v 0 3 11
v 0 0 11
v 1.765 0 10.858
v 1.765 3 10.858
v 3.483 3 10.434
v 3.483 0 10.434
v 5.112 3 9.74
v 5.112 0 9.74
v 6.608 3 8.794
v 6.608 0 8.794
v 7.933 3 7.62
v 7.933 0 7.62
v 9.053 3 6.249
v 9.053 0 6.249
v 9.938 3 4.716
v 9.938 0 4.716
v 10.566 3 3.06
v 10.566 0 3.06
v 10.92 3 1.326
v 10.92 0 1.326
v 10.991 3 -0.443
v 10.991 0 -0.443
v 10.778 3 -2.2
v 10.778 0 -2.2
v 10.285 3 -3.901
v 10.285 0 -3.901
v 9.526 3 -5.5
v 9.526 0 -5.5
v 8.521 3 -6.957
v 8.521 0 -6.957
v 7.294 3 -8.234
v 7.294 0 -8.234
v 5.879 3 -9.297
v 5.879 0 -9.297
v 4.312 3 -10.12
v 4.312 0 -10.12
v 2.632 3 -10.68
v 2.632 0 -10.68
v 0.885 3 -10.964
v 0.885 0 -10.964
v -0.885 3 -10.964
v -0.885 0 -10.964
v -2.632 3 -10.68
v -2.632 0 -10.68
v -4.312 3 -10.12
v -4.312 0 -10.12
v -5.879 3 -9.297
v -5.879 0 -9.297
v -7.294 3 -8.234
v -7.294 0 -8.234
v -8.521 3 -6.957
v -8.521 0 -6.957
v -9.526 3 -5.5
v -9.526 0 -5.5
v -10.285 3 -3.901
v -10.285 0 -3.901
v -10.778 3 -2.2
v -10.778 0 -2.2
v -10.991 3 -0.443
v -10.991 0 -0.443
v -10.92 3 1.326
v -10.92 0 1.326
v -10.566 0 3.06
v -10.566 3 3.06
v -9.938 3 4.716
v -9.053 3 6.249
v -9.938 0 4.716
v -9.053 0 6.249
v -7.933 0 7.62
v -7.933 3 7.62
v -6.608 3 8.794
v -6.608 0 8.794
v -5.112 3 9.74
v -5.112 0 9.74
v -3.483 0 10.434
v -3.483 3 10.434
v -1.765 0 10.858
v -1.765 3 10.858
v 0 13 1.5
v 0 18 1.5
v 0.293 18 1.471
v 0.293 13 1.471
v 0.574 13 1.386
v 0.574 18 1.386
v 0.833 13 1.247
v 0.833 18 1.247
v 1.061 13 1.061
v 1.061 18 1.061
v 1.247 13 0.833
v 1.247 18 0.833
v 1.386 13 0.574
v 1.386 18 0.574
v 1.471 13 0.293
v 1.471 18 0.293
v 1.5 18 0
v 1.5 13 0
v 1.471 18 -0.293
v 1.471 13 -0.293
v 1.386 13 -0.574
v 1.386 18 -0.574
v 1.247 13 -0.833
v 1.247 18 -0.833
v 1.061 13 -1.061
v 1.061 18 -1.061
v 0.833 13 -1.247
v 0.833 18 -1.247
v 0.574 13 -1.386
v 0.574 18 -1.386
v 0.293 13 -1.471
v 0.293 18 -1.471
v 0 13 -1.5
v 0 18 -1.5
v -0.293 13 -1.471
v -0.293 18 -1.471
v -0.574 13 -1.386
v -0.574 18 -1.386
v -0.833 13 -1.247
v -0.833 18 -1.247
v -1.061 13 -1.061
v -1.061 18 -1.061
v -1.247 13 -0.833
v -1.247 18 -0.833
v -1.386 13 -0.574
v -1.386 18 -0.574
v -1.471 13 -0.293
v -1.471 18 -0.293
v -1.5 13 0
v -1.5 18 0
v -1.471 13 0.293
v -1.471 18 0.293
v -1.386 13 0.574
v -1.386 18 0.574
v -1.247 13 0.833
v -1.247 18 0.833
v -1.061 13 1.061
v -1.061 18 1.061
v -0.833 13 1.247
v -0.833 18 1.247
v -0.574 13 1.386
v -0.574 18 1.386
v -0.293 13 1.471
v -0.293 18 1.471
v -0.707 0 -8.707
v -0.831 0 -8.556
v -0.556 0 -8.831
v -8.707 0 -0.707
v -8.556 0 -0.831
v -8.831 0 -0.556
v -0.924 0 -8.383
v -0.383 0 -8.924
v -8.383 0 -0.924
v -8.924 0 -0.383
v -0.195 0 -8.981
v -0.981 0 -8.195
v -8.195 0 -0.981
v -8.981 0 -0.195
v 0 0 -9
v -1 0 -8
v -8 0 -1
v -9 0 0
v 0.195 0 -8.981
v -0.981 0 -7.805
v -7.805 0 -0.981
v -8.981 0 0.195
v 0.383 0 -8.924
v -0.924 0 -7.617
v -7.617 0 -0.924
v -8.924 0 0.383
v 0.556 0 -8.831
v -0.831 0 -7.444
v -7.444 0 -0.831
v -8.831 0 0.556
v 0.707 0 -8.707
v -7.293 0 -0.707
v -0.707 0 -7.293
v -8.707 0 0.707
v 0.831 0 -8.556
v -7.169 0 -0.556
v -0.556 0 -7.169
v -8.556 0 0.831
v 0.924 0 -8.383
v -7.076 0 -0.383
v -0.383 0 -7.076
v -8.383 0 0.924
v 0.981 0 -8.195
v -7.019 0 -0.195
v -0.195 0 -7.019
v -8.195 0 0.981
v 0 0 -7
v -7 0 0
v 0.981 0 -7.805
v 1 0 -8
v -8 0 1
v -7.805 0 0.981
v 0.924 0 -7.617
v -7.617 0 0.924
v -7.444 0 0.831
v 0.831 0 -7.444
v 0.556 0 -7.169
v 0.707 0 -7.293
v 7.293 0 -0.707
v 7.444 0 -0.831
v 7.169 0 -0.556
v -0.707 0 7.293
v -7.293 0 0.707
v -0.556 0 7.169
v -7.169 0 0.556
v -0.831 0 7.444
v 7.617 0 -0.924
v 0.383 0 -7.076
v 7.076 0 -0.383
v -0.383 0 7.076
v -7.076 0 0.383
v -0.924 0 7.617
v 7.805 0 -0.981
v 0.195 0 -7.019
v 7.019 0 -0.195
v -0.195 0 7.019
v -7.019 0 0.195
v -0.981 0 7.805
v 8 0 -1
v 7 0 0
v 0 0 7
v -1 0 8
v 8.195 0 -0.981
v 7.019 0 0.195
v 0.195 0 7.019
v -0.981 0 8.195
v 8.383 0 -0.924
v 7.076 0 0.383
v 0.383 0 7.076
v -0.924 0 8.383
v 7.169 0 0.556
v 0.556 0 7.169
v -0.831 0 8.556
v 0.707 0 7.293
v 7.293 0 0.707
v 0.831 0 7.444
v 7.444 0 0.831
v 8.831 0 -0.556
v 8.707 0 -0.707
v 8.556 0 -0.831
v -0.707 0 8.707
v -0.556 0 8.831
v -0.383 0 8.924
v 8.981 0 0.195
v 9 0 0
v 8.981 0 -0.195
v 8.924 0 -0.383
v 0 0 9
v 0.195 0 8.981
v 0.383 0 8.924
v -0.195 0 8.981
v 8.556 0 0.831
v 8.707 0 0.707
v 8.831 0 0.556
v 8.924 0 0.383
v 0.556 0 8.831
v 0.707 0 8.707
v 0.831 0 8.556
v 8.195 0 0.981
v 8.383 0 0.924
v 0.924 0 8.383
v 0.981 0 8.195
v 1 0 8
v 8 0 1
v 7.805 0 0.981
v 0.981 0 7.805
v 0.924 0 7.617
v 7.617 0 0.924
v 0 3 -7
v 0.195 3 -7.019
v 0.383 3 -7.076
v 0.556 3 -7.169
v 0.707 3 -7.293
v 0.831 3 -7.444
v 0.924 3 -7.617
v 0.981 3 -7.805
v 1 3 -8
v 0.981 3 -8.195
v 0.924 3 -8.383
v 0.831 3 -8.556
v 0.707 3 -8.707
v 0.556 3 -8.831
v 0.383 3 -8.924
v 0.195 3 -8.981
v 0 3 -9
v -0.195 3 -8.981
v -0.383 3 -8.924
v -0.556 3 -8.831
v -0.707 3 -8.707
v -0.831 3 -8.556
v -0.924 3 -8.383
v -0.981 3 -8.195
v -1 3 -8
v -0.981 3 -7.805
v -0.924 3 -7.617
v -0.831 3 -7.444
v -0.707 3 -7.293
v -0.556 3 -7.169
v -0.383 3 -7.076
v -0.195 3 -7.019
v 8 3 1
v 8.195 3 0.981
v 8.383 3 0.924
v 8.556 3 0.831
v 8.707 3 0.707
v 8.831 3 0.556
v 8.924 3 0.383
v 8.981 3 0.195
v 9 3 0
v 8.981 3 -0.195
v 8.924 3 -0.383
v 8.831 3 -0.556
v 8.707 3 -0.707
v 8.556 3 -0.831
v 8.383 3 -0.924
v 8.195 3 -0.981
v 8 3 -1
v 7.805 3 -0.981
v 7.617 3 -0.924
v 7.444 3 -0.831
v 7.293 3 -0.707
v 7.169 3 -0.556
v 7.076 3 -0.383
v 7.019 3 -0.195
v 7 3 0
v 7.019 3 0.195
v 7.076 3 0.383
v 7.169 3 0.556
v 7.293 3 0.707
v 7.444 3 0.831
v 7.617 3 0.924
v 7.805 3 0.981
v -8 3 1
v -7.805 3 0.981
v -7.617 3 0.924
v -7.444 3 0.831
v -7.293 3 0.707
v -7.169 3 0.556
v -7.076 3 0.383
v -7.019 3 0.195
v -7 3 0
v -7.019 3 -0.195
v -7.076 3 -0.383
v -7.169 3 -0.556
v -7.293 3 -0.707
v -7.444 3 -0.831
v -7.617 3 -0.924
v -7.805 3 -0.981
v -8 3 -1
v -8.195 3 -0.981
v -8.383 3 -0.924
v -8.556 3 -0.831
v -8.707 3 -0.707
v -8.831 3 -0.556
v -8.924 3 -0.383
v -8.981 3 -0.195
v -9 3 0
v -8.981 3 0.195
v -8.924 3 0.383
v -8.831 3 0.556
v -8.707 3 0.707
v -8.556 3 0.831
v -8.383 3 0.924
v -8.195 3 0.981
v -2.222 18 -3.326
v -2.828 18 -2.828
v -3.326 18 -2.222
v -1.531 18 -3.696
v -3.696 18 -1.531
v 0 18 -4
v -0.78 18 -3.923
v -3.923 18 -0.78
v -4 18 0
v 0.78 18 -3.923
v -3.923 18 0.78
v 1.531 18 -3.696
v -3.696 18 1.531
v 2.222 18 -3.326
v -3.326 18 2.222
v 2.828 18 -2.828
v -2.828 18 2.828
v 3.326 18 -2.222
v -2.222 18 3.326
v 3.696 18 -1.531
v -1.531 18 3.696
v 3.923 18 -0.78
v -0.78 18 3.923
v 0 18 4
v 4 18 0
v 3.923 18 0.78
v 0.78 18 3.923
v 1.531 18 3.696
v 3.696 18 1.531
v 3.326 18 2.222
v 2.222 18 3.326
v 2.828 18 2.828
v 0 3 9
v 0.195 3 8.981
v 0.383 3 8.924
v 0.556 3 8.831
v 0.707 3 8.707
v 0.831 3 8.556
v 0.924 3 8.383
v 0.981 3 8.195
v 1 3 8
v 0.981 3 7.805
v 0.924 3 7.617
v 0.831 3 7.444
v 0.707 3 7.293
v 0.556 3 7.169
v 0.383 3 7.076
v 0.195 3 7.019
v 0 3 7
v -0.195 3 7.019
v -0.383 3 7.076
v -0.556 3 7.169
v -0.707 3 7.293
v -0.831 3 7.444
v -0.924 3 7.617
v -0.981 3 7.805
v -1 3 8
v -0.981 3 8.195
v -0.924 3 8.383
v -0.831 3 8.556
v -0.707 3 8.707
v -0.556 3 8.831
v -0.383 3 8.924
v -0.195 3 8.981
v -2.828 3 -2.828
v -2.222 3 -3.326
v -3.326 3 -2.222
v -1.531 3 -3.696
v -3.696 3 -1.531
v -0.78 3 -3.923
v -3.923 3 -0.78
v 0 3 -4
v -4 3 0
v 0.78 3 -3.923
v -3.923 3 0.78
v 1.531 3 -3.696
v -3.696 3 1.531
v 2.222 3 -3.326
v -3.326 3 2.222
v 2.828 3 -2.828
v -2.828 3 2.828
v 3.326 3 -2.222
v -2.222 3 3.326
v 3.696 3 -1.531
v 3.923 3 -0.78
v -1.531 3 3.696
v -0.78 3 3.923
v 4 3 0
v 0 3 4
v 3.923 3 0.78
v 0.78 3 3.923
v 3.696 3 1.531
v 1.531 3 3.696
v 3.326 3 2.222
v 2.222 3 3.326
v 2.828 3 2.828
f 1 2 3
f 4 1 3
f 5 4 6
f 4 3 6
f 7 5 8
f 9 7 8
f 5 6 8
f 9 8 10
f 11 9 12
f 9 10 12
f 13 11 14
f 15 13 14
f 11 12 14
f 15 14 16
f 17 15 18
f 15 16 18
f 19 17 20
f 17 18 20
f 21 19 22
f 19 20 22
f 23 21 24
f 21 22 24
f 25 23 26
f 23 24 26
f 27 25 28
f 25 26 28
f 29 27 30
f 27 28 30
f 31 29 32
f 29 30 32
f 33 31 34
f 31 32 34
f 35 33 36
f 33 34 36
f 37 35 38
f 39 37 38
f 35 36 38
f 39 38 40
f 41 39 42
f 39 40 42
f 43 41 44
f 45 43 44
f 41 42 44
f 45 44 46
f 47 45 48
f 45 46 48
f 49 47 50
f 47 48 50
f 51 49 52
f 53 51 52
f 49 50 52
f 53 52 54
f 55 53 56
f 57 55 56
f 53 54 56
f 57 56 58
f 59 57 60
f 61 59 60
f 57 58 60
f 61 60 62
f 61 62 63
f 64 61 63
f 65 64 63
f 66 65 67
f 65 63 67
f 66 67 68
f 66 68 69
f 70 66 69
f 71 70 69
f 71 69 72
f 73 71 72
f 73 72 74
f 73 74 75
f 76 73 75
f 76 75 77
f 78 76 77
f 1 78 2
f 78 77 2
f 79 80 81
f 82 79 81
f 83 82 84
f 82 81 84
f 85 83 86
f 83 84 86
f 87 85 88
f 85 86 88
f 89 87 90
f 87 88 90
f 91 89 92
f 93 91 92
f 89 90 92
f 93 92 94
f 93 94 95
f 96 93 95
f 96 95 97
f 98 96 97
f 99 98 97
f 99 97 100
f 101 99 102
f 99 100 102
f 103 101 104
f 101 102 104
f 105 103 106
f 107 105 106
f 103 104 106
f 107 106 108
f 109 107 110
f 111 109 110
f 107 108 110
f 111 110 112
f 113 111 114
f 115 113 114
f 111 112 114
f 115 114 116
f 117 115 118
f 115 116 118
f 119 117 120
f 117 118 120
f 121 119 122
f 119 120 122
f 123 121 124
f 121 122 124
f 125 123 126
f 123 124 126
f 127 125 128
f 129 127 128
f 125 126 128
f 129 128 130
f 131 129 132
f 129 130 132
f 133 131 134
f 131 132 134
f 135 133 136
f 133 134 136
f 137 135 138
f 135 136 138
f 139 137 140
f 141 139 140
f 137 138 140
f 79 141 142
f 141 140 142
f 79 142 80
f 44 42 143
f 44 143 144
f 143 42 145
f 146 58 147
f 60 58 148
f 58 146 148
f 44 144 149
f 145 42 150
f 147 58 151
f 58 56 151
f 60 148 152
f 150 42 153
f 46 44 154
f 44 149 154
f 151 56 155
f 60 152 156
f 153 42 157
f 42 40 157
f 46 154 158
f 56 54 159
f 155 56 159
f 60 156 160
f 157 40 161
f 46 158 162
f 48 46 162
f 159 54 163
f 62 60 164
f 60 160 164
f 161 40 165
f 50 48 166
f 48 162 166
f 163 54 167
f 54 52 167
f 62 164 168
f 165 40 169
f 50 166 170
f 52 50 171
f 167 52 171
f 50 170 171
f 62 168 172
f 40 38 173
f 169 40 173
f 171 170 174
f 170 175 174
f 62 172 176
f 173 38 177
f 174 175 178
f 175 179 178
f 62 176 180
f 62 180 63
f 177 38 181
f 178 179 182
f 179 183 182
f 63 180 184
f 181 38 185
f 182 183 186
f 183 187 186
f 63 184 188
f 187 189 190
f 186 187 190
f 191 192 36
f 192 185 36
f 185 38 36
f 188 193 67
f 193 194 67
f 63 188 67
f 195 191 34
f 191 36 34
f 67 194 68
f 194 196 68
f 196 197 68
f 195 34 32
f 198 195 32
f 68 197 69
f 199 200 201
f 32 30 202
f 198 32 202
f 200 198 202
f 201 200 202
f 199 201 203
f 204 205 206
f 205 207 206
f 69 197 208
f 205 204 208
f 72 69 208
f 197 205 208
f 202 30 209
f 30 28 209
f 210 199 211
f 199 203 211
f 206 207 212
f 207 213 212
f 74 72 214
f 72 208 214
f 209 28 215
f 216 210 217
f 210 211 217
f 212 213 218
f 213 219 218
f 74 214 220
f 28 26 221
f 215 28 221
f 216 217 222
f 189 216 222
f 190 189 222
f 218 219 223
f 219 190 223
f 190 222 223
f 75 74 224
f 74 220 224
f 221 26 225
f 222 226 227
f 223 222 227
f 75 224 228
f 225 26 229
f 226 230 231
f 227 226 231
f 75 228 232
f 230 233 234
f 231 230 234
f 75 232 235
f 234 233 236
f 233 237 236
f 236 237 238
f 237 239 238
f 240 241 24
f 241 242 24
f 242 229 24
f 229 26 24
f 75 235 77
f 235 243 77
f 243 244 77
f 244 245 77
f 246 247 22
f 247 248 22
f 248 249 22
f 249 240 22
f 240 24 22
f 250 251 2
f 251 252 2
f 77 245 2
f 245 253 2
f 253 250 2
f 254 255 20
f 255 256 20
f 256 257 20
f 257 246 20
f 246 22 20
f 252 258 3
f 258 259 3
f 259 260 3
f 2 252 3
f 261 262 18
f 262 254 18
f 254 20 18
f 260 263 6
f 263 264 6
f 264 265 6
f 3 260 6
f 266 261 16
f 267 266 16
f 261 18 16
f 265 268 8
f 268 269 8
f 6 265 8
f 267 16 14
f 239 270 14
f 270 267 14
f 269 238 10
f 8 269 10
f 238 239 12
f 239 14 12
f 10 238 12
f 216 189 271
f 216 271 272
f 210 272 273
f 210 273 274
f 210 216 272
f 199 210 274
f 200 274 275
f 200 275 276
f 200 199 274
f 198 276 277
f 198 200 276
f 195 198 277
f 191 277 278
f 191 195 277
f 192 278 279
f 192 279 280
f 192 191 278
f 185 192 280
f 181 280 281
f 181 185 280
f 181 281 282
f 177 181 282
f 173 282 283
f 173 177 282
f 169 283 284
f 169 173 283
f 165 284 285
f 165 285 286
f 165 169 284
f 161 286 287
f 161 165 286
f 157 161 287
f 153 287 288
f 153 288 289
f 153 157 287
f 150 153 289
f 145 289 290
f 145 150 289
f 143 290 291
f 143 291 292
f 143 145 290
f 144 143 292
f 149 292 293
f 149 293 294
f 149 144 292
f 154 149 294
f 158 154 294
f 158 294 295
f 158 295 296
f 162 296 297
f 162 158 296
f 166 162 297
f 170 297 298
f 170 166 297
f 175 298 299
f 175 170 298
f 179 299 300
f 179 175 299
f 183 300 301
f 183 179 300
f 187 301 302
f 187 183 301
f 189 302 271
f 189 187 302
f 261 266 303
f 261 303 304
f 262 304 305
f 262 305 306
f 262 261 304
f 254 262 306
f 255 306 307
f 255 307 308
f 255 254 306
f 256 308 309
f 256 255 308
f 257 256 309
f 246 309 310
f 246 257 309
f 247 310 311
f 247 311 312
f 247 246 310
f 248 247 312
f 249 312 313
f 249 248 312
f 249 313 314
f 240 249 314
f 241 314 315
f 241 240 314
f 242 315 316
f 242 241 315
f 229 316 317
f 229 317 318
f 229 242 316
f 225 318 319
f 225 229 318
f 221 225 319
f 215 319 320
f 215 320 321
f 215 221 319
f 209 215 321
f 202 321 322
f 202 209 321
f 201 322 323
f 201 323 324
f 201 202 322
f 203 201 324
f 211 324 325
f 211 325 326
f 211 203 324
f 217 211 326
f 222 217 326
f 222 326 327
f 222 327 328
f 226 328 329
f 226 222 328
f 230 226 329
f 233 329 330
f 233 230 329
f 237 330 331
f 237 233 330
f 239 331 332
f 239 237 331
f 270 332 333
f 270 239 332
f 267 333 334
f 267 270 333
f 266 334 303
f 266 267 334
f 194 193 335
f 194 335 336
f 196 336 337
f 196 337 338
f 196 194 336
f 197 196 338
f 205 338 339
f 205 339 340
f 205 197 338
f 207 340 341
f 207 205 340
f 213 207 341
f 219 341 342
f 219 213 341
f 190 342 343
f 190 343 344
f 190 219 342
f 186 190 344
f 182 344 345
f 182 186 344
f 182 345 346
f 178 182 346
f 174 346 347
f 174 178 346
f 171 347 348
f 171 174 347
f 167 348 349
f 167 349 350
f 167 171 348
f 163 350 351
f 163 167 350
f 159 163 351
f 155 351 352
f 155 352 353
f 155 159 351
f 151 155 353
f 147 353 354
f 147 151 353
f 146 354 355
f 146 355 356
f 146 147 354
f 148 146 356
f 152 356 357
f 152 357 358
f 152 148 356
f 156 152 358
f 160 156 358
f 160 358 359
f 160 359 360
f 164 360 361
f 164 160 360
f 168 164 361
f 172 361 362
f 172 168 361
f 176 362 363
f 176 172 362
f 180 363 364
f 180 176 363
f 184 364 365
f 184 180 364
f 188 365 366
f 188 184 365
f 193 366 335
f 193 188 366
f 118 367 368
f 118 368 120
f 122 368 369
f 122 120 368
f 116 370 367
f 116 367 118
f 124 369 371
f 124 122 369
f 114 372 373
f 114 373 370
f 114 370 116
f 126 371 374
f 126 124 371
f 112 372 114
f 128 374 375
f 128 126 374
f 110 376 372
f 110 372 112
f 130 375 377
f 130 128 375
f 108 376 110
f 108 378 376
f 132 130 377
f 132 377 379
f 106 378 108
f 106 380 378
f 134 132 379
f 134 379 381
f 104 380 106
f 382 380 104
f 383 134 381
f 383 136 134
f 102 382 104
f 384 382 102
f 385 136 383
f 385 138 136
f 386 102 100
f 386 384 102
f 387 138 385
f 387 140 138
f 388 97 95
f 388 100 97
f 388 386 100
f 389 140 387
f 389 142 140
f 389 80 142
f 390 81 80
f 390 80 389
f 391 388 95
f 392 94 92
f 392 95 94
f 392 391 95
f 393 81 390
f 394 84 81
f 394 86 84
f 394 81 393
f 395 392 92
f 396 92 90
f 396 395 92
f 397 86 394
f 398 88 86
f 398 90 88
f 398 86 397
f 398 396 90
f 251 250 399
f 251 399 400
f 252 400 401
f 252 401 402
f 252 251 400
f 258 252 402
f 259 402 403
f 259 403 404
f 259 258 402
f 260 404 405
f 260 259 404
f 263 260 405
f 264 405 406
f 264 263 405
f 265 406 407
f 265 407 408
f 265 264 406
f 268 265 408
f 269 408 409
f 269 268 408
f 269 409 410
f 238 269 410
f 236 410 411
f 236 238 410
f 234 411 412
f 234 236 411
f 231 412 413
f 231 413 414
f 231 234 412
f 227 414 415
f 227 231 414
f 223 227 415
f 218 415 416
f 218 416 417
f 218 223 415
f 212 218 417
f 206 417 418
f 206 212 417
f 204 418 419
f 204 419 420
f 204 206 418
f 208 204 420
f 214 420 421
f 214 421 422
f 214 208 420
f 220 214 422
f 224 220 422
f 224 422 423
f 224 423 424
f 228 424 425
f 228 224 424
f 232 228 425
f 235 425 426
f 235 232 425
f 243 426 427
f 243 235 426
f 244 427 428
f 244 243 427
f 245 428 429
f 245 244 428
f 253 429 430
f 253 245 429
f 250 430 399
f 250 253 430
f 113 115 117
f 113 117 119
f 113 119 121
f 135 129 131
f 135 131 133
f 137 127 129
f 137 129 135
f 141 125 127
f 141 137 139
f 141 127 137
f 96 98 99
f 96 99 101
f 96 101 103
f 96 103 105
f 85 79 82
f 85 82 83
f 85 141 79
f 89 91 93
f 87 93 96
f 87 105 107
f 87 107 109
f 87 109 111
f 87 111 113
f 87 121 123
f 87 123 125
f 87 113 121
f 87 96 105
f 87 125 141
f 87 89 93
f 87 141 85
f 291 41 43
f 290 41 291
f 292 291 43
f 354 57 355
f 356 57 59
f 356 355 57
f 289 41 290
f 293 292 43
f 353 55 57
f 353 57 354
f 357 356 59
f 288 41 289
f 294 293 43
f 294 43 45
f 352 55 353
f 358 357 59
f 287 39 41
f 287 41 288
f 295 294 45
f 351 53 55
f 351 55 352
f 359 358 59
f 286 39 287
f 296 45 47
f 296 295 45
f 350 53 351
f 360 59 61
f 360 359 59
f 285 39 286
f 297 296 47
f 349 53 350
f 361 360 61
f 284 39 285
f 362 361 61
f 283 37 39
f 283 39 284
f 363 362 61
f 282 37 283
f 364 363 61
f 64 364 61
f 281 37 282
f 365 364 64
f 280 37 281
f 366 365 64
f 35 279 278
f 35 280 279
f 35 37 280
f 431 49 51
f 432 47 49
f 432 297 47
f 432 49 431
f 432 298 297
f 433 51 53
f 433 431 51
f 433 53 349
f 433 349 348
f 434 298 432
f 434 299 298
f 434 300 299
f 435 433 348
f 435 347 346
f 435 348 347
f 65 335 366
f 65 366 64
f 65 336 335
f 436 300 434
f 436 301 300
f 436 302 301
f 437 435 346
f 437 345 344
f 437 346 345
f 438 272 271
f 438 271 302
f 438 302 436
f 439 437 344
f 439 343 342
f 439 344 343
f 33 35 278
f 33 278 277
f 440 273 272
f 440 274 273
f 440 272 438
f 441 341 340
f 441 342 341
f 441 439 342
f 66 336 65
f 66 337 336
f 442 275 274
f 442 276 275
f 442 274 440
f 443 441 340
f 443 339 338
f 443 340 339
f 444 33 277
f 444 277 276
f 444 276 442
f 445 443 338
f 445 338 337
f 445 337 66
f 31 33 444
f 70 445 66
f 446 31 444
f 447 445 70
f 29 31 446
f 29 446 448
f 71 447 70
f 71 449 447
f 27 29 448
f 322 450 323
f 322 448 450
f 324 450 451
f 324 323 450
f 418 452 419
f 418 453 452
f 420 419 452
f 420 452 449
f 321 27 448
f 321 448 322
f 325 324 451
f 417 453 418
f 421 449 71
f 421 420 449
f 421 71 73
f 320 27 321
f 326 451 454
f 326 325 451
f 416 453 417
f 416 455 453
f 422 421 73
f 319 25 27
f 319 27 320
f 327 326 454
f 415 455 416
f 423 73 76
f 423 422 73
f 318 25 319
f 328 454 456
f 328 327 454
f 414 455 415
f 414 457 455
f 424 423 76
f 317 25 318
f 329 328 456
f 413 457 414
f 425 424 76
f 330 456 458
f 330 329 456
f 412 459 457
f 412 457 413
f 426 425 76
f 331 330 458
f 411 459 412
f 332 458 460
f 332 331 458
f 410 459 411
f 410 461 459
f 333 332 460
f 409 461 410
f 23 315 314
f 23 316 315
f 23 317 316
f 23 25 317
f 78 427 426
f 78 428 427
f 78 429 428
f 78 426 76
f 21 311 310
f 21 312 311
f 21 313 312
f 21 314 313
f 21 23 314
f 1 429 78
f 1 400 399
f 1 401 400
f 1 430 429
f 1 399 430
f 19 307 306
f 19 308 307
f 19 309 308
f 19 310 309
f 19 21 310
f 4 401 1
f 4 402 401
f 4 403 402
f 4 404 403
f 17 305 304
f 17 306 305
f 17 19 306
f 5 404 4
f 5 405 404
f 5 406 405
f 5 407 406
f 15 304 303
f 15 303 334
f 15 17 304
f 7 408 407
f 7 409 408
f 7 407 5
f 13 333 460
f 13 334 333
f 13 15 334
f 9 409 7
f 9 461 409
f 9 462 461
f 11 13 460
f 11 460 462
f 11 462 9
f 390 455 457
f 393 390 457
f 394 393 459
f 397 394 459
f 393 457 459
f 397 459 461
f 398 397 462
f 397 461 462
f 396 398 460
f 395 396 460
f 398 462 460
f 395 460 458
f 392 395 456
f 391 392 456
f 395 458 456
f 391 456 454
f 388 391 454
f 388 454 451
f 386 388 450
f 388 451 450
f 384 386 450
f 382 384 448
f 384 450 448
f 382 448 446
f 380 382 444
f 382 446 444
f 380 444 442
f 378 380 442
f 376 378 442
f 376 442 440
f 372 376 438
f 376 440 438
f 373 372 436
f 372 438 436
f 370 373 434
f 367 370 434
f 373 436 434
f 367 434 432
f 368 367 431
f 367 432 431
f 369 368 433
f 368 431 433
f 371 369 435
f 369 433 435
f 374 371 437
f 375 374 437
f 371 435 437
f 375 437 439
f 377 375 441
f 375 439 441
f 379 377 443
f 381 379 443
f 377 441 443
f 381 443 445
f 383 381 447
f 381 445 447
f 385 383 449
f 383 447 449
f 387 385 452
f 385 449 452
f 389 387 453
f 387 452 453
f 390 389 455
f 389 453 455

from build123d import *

# Parameters (mm, degrees)
SKETCH1_R           = 11
SKETCH1_R_2         = 1
BOSS_EXTRUDE1_DEPTH = 3
SKETCH2_R           = 4
BOSS_EXTRUDE2_DEPTH = 15
SKETCH3_R           = 1.5
CUT_EXTRUDE1_DEPTH  = 5


with BuildPart() as part:
    # Sketch1 → Boss-Extrude1 (new body)
    with BuildSketch(Plane(origin=(0, 0, 0), x_dir=(1, 0, 0), z_dir=(0, 1, 0))):
        with Locations(Location((0, 0, 0), (0, 0, 270))):
            Circle(SKETCH1_R)
        with Locations(Location((0, 8, 0), (0, 0, 270))):
            Circle(SKETCH1_R_2, mode=Mode.SUBTRACT)
        with Locations(Location((8, 0, 0), (0, 0, 270))):
            Circle(SKETCH1_R_2, mode=Mode.SUBTRACT)
        with Locations(Location((0, -8, 0), (0, 0, 270))):
            Circle(SKETCH1_R_2, mode=Mode.SUBTRACT)
        with Locations(Location((-8, 0, 0), (0, 0, 270))):
            Circle(SKETCH1_R_2, mode=Mode.SUBTRACT)
    extrude(amount=BOSS_EXTRUDE1_DEPTH)

    # Sketch2 → Boss-Extrude2 (add)
    with BuildSketch(Plane(origin=(0, 3, 0), x_dir=(1, 0, 0), z_dir=(0, 1, 0))):
        with Locations(Location((0, 0, 0), (0, 0, 270))):
            Circle(SKETCH2_R)
    extrude(amount=BOSS_EXTRUDE2_DEPTH)

    # Sketch3 → Cut-Extrude1 (cut)
    with BuildSketch(Plane(origin=(0, 18, 0), x_dir=(1, 0, 0), z_dir=(0, 1, 0))):
        with Locations(Location((0, 0, 0), (0, 0, 270))):
            Circle(SKETCH3_R)
    extrude(amount=-CUT_EXTRUDE1_DEPTH, mode=Mode.SUBTRACT)


solid = part.part
